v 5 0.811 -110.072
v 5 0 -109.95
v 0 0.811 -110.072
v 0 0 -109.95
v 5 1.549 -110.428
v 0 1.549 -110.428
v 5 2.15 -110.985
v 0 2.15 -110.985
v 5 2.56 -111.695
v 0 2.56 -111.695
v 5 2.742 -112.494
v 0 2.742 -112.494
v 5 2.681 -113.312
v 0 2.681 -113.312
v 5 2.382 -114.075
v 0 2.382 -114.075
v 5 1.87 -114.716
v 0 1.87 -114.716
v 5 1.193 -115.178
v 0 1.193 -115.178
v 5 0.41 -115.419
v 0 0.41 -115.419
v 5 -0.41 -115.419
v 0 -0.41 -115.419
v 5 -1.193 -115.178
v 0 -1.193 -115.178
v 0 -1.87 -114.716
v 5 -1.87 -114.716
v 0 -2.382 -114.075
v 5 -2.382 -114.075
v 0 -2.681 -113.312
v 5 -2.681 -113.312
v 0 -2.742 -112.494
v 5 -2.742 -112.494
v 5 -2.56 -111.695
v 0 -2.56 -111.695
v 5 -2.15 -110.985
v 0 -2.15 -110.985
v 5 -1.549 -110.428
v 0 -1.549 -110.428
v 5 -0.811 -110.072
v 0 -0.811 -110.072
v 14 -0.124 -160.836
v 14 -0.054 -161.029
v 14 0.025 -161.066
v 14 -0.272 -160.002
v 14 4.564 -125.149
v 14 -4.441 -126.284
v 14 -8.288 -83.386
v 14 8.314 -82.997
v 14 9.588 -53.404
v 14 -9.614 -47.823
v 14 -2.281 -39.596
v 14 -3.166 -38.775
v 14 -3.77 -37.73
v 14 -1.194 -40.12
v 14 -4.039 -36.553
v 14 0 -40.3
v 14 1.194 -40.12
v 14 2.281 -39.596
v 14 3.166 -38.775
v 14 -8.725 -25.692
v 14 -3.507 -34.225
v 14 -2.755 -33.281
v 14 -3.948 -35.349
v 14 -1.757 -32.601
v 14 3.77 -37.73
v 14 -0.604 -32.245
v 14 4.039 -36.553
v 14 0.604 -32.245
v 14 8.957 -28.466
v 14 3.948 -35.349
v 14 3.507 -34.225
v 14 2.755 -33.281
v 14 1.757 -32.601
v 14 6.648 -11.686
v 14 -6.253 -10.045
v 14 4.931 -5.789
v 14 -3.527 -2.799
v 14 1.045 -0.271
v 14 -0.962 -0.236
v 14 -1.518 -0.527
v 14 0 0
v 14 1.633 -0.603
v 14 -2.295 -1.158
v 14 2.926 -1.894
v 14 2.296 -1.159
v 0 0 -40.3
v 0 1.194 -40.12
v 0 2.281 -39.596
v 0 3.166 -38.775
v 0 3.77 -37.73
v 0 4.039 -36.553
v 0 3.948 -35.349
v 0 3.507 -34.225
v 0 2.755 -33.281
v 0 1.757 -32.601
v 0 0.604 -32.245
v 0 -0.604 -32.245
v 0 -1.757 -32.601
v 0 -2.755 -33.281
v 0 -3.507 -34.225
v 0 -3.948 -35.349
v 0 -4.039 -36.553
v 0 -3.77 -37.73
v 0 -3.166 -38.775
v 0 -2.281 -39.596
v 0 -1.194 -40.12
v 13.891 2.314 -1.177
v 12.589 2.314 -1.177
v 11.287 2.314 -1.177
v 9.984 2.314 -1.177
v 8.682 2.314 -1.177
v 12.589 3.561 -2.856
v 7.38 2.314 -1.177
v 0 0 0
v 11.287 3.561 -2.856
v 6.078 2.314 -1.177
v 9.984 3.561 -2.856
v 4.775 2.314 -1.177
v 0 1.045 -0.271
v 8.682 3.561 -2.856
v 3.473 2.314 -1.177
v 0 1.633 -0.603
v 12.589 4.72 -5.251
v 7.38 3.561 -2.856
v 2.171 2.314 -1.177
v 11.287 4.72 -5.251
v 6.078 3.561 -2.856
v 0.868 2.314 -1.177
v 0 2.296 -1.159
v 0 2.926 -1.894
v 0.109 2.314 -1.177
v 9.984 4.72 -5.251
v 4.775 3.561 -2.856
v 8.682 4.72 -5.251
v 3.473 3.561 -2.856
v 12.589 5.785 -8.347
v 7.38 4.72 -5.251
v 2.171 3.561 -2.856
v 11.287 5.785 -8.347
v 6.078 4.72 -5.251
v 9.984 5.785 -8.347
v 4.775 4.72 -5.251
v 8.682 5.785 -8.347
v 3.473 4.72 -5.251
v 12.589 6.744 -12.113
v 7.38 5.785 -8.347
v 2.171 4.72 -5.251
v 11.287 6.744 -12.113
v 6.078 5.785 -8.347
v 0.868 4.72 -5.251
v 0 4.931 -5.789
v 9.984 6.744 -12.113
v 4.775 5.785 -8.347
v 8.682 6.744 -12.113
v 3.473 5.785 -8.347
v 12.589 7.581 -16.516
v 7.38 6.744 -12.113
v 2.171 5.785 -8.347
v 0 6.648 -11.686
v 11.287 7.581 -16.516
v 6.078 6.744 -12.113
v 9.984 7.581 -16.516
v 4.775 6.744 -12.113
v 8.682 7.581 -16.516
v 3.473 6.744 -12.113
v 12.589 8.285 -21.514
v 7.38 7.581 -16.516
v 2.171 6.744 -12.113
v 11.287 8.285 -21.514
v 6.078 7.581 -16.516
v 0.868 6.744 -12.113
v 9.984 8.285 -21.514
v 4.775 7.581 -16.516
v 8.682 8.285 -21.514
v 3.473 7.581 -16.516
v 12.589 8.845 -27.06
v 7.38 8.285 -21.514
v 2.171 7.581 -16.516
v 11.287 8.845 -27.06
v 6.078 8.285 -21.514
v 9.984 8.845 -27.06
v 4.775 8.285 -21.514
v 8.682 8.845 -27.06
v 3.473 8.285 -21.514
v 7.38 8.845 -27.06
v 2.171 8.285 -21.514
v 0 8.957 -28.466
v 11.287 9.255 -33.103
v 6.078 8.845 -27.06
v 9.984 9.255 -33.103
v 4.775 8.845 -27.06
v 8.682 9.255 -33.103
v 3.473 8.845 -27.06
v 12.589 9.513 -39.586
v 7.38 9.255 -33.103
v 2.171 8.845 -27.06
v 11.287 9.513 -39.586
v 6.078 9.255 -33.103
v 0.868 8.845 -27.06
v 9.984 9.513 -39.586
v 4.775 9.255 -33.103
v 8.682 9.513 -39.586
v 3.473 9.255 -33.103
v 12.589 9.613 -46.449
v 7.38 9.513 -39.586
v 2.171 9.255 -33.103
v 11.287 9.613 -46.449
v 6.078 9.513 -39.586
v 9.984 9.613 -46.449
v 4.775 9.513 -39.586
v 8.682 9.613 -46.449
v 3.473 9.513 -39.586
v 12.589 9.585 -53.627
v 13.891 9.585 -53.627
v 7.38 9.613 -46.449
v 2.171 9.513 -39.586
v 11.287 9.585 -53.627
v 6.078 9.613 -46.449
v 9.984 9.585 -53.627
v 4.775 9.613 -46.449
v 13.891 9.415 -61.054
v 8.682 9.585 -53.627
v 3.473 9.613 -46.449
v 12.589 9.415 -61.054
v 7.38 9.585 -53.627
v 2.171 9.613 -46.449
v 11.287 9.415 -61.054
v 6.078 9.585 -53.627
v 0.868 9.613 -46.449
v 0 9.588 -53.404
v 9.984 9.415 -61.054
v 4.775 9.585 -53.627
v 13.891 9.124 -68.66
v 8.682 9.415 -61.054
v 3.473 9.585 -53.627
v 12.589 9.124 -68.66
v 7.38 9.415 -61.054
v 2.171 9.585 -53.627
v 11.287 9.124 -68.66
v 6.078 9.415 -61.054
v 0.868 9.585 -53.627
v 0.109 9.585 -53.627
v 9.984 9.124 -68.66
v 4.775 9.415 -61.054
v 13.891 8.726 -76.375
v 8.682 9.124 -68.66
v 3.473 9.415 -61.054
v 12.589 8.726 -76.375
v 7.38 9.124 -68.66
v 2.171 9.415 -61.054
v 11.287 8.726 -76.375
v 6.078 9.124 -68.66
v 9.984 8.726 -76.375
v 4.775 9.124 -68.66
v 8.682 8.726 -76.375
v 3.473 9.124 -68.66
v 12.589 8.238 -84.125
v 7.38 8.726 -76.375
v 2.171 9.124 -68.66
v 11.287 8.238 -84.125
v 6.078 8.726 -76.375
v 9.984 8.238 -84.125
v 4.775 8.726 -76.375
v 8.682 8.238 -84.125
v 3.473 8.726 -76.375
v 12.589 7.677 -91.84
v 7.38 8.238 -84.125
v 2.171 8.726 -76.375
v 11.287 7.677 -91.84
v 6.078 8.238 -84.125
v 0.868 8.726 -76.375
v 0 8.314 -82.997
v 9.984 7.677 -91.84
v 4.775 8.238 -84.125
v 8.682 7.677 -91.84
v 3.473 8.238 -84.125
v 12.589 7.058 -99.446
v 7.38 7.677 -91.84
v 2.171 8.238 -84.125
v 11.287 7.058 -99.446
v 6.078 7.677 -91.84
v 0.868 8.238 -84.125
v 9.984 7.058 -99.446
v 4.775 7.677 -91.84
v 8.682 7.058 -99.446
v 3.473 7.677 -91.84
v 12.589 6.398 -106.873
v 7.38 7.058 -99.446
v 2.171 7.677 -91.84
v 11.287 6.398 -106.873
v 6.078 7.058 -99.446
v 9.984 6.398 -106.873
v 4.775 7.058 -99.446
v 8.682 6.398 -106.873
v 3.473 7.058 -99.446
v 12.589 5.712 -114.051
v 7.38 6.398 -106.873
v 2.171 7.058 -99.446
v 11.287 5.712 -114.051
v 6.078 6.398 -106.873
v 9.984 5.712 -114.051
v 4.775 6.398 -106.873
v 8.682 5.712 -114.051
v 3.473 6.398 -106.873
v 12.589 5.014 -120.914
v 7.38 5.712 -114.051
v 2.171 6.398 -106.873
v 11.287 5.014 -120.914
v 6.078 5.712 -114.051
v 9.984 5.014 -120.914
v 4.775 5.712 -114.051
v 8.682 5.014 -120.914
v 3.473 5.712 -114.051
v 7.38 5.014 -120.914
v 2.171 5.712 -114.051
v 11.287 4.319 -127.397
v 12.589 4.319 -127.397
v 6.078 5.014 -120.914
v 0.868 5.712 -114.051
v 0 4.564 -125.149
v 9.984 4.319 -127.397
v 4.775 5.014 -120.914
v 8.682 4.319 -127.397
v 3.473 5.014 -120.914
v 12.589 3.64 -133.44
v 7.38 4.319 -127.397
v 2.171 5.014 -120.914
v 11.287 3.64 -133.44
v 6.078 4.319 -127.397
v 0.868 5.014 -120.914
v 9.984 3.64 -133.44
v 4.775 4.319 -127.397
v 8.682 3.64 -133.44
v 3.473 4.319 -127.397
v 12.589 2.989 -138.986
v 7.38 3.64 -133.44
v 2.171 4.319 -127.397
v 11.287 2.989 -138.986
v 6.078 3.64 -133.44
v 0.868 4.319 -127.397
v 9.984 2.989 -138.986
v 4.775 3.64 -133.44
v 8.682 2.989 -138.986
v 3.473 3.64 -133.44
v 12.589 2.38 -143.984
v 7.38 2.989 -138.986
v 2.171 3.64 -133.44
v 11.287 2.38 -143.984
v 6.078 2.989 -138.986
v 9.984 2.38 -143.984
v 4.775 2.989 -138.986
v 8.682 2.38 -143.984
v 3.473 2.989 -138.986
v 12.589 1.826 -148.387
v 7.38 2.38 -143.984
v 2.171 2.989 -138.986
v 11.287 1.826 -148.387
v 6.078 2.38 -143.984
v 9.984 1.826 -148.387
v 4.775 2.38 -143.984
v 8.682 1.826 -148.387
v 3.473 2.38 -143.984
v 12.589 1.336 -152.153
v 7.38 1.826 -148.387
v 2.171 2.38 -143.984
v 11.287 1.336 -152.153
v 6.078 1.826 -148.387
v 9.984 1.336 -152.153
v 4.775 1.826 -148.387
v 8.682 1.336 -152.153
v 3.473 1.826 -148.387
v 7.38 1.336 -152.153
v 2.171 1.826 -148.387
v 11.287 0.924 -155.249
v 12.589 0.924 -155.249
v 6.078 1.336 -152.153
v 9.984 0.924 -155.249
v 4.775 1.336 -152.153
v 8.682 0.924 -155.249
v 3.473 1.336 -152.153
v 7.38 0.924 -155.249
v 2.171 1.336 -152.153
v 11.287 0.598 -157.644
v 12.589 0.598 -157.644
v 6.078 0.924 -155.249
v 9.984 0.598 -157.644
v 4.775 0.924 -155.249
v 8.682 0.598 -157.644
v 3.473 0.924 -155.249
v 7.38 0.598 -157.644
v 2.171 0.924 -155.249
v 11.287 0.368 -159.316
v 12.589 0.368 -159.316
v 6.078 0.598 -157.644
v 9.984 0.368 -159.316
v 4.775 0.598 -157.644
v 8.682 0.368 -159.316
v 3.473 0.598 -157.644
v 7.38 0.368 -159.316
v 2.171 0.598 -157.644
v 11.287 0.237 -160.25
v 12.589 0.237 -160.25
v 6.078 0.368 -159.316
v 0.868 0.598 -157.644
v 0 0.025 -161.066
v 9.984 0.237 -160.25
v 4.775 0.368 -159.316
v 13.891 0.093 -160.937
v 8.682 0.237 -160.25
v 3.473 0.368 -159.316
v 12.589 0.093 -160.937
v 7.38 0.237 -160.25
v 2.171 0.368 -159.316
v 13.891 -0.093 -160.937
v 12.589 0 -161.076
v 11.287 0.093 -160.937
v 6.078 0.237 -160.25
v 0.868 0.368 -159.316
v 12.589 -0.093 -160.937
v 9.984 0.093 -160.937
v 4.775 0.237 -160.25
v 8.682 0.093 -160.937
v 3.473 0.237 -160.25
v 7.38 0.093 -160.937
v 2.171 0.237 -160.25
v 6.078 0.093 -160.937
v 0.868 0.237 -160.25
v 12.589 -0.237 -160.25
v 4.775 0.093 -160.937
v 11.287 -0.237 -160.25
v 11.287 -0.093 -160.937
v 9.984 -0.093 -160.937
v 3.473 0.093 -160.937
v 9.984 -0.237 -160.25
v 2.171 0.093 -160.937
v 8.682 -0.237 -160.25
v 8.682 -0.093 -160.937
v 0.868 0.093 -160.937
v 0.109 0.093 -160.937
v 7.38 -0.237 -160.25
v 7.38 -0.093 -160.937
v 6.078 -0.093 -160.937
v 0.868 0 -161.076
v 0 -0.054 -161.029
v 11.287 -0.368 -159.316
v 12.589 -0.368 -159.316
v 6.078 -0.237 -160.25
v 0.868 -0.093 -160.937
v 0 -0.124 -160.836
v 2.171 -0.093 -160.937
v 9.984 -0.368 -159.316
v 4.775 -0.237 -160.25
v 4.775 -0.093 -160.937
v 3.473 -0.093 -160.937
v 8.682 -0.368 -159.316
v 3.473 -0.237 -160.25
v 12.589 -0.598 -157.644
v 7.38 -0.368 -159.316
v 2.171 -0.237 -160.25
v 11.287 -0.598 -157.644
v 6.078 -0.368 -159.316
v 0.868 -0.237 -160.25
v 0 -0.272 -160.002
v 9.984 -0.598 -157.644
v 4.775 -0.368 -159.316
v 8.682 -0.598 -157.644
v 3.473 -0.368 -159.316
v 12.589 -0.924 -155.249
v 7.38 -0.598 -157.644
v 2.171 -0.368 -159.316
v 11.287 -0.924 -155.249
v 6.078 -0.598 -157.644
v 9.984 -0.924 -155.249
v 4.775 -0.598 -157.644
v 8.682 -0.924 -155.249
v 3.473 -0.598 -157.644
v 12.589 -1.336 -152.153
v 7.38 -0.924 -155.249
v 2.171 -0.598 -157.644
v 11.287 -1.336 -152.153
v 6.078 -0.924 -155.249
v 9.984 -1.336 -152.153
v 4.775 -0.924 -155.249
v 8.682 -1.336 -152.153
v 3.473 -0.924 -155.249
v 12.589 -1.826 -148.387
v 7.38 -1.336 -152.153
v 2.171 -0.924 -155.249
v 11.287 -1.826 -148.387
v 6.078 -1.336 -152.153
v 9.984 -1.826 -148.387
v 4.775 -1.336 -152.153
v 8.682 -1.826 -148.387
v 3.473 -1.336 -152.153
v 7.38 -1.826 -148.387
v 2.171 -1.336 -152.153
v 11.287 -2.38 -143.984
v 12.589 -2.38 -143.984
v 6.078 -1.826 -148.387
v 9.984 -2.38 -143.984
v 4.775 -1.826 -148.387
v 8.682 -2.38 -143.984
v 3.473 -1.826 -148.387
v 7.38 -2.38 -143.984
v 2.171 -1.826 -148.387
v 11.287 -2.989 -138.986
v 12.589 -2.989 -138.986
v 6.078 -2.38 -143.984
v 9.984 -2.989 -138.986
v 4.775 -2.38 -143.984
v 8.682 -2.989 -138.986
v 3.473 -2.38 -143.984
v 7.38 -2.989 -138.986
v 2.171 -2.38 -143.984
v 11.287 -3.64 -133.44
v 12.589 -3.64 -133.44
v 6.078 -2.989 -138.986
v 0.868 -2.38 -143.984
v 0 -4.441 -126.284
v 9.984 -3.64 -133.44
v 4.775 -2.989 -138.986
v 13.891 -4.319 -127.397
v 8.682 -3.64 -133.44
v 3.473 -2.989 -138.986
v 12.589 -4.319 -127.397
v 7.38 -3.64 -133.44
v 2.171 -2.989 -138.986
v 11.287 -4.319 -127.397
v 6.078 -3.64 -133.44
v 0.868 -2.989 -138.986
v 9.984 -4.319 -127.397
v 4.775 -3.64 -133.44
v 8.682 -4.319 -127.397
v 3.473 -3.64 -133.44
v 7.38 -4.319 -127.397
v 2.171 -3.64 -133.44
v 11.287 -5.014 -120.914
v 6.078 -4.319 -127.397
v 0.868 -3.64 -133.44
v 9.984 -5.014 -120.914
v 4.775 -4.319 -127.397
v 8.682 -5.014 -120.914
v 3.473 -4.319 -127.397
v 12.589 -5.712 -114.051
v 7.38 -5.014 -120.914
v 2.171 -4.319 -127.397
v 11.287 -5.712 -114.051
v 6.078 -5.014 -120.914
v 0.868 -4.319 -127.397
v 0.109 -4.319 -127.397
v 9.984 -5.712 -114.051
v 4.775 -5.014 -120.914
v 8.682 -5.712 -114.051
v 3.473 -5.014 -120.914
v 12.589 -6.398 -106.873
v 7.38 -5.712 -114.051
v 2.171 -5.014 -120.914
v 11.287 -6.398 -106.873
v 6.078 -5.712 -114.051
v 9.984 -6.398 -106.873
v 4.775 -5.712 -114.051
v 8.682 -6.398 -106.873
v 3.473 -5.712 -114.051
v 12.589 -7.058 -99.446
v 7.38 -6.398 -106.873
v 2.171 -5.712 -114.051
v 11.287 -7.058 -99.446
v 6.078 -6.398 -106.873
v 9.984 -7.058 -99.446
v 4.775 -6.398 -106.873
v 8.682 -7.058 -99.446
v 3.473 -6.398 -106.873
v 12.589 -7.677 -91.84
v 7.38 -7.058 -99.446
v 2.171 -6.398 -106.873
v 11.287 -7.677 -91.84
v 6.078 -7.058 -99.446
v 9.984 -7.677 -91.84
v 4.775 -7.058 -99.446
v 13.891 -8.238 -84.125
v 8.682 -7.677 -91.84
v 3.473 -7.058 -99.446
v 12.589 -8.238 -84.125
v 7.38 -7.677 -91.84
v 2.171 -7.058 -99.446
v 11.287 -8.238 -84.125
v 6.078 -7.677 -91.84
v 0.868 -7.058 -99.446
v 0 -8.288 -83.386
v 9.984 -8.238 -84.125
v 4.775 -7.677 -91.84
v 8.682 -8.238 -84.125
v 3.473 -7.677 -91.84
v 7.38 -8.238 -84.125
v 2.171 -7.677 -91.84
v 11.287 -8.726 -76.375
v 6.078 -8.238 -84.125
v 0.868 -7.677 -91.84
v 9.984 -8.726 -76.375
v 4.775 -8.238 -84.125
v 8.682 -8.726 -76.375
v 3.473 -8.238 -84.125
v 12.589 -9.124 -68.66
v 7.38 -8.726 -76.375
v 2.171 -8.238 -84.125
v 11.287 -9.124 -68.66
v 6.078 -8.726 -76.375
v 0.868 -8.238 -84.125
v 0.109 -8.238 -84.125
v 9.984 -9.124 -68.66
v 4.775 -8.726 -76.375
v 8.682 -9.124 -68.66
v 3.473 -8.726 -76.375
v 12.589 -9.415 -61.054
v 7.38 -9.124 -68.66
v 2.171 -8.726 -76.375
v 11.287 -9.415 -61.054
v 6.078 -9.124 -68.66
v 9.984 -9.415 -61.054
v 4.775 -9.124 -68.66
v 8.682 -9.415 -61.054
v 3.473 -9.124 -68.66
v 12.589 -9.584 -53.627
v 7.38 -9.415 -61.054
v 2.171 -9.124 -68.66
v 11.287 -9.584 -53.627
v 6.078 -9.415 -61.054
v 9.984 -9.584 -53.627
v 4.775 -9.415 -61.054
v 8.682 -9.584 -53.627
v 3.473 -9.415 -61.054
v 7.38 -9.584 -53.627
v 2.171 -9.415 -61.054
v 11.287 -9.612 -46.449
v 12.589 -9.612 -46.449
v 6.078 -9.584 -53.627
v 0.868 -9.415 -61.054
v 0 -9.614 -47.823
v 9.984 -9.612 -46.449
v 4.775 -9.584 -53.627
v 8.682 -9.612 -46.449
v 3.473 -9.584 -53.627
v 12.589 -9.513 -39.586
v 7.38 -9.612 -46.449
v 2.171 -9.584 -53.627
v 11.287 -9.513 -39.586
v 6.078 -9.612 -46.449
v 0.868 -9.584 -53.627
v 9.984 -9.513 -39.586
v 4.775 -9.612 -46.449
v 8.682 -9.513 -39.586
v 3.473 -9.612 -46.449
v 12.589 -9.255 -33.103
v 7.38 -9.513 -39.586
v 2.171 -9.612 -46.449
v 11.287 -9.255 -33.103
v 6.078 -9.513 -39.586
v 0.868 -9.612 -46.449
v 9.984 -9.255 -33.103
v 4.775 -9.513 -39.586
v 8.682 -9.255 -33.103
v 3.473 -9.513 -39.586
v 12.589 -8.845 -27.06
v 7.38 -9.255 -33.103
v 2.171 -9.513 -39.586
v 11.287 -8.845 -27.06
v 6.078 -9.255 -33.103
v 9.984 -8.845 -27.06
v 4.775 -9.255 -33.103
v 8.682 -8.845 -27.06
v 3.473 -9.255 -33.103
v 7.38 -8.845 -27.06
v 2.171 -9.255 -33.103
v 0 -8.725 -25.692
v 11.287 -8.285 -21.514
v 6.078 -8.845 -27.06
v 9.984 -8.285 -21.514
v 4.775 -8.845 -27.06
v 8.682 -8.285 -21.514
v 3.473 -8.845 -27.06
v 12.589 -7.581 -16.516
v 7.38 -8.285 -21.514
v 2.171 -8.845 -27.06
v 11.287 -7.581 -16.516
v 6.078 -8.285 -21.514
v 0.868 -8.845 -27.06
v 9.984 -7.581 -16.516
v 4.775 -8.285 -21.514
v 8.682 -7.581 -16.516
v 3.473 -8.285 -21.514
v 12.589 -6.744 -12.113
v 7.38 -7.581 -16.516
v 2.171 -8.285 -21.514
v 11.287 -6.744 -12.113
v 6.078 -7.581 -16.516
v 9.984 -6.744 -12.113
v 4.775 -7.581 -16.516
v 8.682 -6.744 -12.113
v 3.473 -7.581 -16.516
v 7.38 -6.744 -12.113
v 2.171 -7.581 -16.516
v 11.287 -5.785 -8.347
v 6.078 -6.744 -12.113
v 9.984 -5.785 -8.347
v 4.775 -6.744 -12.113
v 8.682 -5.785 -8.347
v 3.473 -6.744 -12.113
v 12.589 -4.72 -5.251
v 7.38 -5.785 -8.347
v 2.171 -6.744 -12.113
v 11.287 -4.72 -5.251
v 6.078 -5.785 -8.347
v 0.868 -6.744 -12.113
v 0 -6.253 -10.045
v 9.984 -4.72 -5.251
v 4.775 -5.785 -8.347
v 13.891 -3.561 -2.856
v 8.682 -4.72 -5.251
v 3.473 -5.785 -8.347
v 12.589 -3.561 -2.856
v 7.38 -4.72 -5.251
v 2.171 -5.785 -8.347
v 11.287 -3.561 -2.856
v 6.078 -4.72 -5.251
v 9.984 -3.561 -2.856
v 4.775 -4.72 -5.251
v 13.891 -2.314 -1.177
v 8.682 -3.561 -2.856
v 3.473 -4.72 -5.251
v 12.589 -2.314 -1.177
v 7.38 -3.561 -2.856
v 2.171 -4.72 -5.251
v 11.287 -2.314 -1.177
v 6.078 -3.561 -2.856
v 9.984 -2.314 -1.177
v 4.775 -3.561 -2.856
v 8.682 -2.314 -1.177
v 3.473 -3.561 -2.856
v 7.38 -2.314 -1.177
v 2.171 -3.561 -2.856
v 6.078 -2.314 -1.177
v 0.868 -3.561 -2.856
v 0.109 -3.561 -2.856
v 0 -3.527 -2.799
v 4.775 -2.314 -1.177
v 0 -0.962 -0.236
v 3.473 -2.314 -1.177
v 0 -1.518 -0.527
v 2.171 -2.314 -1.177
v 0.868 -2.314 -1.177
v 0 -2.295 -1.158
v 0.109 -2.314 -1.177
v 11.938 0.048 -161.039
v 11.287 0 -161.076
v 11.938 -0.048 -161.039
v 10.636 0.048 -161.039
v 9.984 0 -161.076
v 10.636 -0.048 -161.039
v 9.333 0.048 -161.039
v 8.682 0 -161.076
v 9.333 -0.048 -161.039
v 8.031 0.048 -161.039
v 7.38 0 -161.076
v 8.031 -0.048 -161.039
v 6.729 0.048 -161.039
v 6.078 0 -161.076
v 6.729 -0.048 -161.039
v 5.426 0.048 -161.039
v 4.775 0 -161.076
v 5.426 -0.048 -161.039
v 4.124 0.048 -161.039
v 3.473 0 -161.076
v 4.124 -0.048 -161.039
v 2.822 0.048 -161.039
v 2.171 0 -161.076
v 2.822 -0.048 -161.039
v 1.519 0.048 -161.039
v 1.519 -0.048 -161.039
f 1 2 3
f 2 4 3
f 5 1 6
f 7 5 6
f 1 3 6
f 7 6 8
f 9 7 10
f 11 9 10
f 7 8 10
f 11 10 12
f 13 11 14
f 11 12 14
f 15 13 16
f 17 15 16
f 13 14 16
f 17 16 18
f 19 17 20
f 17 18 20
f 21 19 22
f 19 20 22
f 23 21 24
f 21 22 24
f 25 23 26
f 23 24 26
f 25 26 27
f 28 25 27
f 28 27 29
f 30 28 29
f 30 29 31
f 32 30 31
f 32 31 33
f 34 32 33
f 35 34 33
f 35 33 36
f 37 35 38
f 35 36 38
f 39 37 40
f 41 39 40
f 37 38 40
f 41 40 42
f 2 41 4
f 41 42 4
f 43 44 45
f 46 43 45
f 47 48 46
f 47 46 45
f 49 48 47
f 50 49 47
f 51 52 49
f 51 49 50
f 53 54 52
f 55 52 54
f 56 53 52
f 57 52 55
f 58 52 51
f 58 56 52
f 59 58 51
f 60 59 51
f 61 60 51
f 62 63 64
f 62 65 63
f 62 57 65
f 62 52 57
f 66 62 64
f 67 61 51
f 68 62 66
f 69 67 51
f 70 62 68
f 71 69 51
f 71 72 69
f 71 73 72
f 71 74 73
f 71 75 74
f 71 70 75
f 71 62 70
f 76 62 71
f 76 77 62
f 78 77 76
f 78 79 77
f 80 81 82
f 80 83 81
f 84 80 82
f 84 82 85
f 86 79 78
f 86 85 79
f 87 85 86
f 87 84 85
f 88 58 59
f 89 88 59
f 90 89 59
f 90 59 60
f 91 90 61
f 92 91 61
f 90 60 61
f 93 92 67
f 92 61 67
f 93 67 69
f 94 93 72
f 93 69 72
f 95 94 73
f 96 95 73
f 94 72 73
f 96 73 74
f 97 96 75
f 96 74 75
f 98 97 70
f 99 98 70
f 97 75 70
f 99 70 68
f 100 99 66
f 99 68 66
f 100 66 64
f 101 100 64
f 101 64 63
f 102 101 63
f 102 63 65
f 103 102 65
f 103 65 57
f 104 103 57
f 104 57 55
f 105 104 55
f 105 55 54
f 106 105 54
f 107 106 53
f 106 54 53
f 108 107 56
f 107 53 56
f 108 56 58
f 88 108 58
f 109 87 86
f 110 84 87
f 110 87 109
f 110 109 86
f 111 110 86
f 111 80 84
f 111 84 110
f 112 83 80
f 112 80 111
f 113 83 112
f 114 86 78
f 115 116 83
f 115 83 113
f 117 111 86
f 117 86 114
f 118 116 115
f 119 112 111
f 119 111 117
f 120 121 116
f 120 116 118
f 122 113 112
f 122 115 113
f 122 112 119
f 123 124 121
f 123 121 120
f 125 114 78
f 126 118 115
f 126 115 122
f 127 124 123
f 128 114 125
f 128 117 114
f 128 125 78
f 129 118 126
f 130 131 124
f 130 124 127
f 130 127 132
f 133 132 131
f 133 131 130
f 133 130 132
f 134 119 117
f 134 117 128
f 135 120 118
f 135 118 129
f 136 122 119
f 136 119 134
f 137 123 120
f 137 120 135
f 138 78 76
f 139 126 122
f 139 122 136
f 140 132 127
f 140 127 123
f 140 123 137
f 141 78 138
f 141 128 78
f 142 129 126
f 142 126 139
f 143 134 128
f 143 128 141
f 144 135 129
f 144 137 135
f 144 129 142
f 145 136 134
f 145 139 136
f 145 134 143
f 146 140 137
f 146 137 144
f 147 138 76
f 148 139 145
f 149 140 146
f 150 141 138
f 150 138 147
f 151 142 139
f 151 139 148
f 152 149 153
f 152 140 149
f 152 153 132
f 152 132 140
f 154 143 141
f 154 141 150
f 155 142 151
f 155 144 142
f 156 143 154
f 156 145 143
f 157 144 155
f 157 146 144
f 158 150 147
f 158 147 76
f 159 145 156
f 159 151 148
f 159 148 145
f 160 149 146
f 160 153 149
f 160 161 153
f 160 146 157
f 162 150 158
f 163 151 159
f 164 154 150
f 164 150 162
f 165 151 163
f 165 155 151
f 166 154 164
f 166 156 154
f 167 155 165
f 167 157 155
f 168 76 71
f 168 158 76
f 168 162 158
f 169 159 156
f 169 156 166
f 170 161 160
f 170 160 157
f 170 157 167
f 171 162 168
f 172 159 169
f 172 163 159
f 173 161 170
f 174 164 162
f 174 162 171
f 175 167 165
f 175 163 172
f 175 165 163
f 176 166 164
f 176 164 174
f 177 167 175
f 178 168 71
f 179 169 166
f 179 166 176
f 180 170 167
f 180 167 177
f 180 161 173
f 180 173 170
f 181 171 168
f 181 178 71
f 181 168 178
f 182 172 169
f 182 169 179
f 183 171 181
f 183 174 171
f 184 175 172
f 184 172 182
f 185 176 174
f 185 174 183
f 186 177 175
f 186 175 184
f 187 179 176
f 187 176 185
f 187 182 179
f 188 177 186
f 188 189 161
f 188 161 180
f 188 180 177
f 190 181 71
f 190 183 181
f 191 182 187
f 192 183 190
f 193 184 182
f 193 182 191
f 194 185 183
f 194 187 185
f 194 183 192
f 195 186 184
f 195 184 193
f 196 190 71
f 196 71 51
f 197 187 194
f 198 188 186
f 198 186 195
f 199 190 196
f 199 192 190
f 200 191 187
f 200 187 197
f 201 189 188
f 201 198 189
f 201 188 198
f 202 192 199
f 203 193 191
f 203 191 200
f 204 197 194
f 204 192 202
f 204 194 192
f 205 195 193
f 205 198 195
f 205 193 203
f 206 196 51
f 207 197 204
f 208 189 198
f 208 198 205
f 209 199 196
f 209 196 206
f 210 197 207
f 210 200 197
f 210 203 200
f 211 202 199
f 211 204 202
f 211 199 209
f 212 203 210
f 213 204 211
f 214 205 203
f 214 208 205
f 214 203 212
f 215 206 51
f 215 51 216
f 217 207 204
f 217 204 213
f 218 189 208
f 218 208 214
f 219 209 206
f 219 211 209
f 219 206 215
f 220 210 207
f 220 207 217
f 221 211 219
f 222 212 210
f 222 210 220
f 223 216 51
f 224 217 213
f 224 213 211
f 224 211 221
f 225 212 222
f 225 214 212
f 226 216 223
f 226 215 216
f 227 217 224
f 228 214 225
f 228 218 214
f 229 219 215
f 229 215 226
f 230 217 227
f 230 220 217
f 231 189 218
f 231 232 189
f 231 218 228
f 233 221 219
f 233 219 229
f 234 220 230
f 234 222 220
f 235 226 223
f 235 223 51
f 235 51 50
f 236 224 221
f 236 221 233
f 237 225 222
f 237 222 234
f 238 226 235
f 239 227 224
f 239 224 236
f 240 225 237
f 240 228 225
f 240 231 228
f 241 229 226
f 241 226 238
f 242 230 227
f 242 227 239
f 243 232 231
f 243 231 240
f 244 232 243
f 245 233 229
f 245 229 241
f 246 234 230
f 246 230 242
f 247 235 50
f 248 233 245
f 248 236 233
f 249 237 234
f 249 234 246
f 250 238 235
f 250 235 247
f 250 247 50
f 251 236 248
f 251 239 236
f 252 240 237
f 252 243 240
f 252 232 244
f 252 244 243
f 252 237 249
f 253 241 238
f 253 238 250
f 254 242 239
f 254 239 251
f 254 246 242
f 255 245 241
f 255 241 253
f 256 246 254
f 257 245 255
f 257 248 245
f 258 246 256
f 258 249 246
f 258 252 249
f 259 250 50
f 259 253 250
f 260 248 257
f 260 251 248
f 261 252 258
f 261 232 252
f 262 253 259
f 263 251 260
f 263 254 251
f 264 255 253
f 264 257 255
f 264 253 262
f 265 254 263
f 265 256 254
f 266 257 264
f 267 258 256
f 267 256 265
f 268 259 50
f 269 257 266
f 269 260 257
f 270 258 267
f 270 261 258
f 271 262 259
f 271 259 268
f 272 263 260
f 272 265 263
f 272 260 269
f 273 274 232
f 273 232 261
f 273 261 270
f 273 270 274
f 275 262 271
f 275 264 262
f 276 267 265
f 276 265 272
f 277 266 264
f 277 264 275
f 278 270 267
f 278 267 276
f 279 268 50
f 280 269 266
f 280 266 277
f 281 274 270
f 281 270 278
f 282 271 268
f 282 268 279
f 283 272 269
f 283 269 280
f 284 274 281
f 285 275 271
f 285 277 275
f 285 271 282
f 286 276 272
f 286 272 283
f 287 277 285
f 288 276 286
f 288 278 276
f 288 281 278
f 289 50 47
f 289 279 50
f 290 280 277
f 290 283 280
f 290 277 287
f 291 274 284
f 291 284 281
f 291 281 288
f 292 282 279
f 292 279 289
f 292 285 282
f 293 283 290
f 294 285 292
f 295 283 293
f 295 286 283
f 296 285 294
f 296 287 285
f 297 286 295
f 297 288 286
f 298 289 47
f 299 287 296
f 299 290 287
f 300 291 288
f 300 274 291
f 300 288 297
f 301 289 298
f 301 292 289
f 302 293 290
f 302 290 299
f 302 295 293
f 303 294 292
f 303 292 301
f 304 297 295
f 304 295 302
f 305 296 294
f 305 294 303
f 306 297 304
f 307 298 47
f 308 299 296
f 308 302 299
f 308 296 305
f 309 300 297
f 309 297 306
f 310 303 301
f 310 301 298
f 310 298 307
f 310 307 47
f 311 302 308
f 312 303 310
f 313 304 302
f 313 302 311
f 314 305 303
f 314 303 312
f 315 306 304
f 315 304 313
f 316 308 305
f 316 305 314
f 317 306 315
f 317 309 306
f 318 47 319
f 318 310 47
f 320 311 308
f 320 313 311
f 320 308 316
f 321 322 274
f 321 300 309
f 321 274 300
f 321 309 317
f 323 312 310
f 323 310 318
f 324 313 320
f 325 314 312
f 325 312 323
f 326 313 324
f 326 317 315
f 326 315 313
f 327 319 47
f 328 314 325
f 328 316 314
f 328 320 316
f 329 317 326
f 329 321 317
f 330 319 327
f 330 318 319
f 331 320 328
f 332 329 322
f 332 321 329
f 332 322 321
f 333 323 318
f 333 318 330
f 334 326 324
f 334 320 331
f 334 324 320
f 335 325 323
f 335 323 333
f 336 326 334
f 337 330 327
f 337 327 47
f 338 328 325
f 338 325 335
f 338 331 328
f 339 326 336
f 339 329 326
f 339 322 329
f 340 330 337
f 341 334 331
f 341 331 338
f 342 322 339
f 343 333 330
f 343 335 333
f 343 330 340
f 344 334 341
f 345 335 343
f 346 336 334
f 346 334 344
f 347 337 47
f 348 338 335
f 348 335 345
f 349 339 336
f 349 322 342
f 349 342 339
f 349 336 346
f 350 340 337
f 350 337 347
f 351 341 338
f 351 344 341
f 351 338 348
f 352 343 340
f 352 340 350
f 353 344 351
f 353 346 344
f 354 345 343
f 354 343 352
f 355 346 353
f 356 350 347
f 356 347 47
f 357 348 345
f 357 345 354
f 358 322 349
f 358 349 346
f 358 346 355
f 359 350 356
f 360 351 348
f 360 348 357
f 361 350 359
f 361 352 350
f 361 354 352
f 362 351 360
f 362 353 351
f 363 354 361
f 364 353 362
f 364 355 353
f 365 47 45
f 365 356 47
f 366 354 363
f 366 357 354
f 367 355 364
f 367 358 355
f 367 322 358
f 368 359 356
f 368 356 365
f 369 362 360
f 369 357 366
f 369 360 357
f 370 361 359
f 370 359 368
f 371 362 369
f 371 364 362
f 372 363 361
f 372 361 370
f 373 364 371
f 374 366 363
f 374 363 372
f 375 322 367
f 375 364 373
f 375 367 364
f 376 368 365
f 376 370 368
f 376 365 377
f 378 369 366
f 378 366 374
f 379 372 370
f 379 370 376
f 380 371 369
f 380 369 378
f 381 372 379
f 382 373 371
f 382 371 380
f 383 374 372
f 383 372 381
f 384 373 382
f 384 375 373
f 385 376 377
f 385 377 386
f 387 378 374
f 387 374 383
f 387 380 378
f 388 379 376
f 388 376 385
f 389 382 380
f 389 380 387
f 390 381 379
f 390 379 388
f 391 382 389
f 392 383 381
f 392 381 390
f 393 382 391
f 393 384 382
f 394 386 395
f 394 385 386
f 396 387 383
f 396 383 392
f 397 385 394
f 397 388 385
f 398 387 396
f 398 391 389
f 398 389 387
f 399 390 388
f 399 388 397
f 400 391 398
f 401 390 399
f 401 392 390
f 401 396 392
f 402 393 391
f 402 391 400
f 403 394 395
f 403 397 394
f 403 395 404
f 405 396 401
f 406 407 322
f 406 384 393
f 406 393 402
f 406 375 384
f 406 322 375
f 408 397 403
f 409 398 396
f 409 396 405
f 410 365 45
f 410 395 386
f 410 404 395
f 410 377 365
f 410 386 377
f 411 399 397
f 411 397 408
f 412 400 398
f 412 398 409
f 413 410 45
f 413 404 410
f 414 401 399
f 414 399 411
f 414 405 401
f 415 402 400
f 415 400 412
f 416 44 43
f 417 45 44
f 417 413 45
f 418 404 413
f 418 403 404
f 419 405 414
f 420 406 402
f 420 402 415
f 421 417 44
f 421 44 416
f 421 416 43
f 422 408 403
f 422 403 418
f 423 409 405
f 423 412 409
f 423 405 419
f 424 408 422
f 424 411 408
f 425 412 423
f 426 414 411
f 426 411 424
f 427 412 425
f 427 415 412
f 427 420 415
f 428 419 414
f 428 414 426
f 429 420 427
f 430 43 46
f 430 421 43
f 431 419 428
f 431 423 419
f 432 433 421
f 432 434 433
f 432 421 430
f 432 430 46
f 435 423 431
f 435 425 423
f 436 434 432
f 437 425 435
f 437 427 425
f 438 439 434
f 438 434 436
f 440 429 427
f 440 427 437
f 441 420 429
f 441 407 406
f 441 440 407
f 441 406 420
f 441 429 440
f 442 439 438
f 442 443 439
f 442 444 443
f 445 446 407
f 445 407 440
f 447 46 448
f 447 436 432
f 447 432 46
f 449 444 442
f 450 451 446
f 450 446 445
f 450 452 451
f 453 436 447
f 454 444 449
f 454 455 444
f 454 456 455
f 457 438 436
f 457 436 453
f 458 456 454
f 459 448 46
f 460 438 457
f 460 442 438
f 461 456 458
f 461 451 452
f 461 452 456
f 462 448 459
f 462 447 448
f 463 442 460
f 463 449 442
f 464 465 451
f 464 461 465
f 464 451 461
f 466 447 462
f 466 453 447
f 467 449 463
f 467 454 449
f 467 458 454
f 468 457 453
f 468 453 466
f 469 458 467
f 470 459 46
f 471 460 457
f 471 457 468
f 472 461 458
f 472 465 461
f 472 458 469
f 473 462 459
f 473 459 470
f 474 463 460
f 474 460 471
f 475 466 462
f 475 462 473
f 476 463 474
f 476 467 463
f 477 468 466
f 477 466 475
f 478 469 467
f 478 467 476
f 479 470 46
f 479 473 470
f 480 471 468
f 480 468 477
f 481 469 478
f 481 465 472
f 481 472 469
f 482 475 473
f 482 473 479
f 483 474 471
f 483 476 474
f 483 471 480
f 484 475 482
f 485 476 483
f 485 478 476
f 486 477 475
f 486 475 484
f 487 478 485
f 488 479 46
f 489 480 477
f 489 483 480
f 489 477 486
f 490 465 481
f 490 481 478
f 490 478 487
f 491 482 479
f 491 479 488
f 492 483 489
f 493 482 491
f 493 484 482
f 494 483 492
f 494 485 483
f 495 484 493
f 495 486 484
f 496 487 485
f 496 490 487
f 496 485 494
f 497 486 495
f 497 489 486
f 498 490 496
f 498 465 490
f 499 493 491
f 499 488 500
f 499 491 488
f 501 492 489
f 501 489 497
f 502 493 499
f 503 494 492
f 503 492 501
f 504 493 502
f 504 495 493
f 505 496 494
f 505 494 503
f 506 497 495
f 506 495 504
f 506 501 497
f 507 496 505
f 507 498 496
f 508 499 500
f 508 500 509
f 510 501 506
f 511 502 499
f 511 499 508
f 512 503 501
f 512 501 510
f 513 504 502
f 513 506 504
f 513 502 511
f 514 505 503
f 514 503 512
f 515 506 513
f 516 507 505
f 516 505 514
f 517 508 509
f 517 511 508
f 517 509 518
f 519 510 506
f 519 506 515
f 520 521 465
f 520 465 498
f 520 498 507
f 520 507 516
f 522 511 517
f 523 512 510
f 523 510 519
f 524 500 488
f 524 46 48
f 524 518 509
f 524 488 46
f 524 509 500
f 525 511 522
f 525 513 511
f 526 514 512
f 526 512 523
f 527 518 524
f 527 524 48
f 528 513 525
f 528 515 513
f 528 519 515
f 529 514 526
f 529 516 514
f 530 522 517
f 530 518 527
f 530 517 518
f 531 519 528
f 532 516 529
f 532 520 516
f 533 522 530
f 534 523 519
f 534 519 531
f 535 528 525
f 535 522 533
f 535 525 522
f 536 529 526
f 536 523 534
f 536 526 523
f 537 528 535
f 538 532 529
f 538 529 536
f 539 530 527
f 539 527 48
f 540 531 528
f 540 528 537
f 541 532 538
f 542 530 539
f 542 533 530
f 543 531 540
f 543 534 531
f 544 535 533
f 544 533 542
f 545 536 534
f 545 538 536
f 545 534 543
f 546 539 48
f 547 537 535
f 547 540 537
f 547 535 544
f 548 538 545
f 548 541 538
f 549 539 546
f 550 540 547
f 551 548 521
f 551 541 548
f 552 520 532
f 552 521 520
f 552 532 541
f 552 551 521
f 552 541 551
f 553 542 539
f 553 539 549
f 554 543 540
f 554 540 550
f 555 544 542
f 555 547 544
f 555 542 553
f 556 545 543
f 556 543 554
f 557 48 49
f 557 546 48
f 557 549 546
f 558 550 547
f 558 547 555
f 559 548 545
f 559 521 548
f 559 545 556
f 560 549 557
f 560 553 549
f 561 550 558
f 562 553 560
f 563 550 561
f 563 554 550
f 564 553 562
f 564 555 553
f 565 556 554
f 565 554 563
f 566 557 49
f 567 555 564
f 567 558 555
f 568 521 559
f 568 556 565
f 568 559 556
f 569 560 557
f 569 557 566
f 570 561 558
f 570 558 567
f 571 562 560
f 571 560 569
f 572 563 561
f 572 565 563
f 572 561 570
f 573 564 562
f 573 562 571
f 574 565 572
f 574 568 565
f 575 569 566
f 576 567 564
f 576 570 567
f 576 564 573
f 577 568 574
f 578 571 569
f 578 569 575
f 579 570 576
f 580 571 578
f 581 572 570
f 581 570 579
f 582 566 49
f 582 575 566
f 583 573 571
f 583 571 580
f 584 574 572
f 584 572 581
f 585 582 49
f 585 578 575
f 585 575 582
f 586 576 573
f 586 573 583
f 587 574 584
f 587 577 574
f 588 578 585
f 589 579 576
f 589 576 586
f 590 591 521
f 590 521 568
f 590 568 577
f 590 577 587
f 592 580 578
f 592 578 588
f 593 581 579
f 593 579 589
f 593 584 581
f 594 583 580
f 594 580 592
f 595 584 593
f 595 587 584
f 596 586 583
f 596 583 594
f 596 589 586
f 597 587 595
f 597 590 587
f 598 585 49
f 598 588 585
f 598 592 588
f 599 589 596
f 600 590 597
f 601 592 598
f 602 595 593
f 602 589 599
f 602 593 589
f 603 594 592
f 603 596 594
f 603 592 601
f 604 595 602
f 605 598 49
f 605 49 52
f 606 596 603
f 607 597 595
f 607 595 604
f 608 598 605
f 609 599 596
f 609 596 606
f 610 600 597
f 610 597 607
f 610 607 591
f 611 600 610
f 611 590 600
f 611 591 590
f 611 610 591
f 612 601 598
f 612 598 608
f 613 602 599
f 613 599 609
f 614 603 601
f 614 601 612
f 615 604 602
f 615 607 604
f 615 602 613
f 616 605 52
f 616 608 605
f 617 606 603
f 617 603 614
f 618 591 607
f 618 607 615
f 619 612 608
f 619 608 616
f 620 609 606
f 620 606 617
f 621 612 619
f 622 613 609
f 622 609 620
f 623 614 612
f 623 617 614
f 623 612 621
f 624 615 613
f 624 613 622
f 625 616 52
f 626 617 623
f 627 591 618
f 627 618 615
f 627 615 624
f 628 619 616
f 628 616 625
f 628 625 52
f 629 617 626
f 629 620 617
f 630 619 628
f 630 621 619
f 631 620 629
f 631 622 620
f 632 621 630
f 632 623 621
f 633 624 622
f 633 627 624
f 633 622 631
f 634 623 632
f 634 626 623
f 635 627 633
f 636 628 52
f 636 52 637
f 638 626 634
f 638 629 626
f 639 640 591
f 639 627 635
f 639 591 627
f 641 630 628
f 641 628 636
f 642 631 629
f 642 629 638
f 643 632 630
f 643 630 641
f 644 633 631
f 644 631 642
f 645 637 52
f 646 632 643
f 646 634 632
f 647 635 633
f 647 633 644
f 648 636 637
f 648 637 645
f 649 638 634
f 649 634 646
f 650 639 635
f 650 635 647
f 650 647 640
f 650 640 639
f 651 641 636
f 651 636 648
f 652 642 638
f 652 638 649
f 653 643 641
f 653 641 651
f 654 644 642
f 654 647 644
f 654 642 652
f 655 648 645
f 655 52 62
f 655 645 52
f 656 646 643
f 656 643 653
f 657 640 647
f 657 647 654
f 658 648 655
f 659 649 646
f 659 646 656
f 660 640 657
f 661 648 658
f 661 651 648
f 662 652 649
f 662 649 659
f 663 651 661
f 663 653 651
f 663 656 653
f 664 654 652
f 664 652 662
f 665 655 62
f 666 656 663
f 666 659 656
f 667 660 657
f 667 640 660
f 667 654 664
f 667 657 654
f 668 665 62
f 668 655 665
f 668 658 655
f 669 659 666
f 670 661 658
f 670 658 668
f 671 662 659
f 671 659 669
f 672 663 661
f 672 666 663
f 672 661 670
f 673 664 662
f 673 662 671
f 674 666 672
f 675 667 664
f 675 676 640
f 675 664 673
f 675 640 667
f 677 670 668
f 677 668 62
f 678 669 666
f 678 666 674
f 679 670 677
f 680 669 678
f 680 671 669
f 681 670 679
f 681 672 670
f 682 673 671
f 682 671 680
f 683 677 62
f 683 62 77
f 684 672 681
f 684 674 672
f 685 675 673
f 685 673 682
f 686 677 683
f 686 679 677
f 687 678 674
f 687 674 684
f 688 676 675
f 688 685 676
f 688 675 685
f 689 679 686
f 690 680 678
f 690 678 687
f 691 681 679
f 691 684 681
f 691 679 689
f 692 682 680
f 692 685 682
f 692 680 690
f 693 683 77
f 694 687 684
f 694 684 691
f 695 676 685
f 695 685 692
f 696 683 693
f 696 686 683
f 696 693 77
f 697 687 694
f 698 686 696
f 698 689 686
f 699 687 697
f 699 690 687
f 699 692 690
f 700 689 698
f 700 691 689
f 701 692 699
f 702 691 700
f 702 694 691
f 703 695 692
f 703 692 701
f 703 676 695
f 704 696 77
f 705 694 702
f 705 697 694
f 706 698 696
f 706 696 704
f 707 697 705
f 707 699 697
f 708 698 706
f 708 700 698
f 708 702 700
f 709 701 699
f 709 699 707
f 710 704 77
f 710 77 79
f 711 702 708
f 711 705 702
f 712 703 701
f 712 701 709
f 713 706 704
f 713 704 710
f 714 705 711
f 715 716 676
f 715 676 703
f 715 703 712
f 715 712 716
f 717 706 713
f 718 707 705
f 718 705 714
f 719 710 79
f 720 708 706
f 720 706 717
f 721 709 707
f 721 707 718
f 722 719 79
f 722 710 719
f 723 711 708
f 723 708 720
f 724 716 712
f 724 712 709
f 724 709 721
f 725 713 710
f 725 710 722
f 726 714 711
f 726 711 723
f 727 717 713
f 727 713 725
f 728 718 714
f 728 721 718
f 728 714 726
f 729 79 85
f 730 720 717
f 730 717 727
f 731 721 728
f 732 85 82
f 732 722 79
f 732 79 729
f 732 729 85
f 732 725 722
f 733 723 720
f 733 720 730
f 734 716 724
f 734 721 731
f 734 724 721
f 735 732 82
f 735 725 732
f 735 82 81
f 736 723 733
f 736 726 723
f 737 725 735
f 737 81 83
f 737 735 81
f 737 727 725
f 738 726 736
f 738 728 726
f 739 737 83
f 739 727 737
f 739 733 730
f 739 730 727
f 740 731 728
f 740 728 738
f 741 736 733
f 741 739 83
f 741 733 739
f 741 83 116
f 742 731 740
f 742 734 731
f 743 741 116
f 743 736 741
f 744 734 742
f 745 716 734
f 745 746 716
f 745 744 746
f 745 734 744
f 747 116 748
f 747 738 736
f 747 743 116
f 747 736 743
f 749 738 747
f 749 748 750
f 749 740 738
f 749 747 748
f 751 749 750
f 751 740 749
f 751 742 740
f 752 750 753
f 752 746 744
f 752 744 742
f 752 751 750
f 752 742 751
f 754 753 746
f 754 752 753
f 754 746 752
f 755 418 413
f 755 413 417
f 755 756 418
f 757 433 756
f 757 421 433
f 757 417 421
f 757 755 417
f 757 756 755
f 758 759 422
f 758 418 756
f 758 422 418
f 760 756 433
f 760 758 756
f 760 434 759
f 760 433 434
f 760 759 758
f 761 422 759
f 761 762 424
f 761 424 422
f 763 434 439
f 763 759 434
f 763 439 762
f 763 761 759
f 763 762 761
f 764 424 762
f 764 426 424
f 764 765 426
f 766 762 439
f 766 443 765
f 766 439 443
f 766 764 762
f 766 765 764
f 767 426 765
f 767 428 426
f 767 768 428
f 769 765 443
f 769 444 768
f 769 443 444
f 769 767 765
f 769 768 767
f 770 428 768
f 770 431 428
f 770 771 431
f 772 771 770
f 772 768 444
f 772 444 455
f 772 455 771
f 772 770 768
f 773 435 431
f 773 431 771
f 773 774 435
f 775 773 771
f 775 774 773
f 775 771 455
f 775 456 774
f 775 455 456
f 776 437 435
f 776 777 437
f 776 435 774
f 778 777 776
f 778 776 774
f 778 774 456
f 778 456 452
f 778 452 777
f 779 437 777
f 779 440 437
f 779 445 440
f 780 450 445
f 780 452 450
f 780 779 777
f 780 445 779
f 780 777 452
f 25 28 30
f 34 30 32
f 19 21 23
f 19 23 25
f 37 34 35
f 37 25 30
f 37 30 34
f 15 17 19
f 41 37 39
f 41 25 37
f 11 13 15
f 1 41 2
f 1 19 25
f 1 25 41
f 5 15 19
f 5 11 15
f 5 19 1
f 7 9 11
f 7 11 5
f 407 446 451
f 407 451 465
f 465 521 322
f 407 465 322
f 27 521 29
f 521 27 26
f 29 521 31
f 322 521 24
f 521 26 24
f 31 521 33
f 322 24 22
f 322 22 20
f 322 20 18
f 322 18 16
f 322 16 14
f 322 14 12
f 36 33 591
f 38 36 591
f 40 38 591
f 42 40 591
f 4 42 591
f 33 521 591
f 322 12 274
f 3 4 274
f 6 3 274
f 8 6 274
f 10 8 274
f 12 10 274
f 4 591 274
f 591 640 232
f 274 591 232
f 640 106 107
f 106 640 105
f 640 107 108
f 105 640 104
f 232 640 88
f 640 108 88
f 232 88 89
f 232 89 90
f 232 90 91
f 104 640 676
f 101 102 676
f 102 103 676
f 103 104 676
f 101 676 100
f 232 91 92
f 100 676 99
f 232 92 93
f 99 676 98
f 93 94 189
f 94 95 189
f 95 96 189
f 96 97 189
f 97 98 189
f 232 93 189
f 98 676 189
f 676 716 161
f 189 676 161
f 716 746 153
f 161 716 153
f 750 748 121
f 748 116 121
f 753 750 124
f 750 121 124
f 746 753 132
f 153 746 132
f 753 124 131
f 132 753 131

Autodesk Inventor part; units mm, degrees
ref_plane "YZ Plane" through (0, 0, 0) normal (1, 0, 0) x (0, 1, 0)
ref_plane "XZ Plane" through (0, 0, 0) normal (0, 1, 0) x (-1, 0, 0)
ref_plane "XY Plane" through (0, 0, 0) normal (0, 0, 1) x (1, 0, 0)
sketch "Sketch9" plane through (0, 0, 0) normal (1, 0, 0) x (0, 1, 0)
  line L0 (0, 0) -> (0.6838, -0.0937) construction
  line L1 (0.6838, -0.0937) -> (1.3528, -0.3746) construction
  line L2 (1.3528, -0.3746) -> (2.0064, -0.8421) construction
  line L3 (2.0064, -0.8421) -> (2.6435, -1.495) construction
  line L4 (2.6435, -1.495) -> (3.263, -2.3319) construction
  line L5 (3.263, -2.3319) -> (3.8633, -3.3508) construction
  line L6 (3.8633, -3.3508) -> (4.4431, -4.5492) construction
  line L7 (4.4431, -4.5492) -> (5.0005, -5.9245) construction
  line L8 (5.0005, -5.9245) -> (5.5339, -7.4733) construction
  line L9 (5.5339, -7.4733) -> (6.0414, -9.1922) construction
  line L10 (6.0414, -9.1922) -> (6.5213, -11.0769) construction
  line L11 (6.5213, -11.0769) -> (6.9717, -13.1233) construction
  line L12 (6.9717, -13.1233) -> (7.3908, -15.3264) construction
  line L13 (7.3908, -15.3264) -> (7.7773, -17.6811) construction
  line L14 (7.7773, -17.6811) -> (8.1295, -20.182) construction
  line L15 (8.1295, -20.182) -> (8.4463, -22.8232) construction
  line L16 (8.4463, -22.8232) -> (8.7266, -25.5985) construction
  line L17 (8.7266, -25.5985) -> (8.9696, -28.5014) construction
  line L18 (8.9696, -28.5014) -> (9.1748, -31.5252) construction
  line L19 (9.1748, -31.5252) -> (9.3419, -34.6628) construction
  line L20 (9.3419, -34.6628) -> (9.4708, -37.9069) construction
  line L21 (9.4708, -37.9069) -> (9.5619, -41.2498) construction
  line L22 (9.5619, -41.2498) -> (9.6156, -44.6839) construction
  line L23 (9.6156, -44.6839) -> (9.6156, -48.201) construction
  line L24 (9.6156, -48.201) -> (9.6156, -51.793) construction
  line L25 (9.6156, -51.793) -> (9.5617, -55.4514) construction
  line L26 (9.5617, -55.4514) -> (9.4762, -59.1677) construction
  line L27 (9.4762, -59.1677) -> (9.3595, -62.9333) construction
  line L28 (9.3595, -62.9333) -> (9.2132, -66.7394) construction
  line L29 (9.2132, -66.7394) -> (9.0394, -70.5769) construction
  line L30 (9.0394, -70.5769) -> (8.8398, -74.4371) construction
  line L31 (8.8398, -74.4371) -> (8.6167, -78.3109) construction
  line L32 (8.6167, -78.3109) -> (8.372, -82.1891) construction
  line L33 (8.372, -82.1891) -> (8.1078, -86.0629) construction
  line L34 (8.1078, -86.0629) -> (7.8263, -89.9231) construction
  line L35 (7.8263, -89.9231) -> (7.5294, -93.7607) construction
  line L36 (7.5294, -93.7607) -> (7.2193, -97.5667) construction
  line L37 (7.2193, -97.5667) -> (6.8979, -101.3323) construction
  line L38 (6.8979, -101.3323) -> (6.5672, -105.0486) construction
  line L39 (6.5672, -105.0486) -> (6.2291, -108.7071) construction
  line L40 (6.2291, -108.7071) -> (5.8855, -112.299) construction
  line L41 (5.8855, -112.299) -> (5.5382, -115.8161) construction
  line L42 (5.5382, -115.8161) -> (5.1889, -119.2502) construction
  line L43 (5.1889, -119.2502) -> (4.8393, -122.5931) construction
  line L44 (4.8393, -122.5931) -> (4.4912, -125.8372) construction
  line L45 (4.4912, -125.8372) -> (4.1463, -128.9748) construction
  line L46 (4.1463, -128.9748) -> (3.8061, -131.9986) construction
  line L47 (3.8061, -131.9986) -> (3.4724, -134.9015) construction
  line L48 (3.4724, -134.9015) -> (3.1466, -137.6768) construction
  line L49 (3.1466, -137.6768) -> (2.8305, -140.318) construction
  line L50 (2.8305, -140.318) -> (2.5255, -142.8189) construction
  line L51 (2.5255, -142.8189) -> (2.2332, -145.1736) construction
  line L52 (2.2332, -145.1736) -> (1.9553, -147.3767) construction
  line L53 (1.9553, -147.3767) -> (1.693, -149.4231) construction
  line L54 (1.693, -149.4231) -> (1.448, -151.3078) construction
  line L55 (1.448, -151.3078) -> (1.2215, -153.0267) construction
  line L56 (1.2215, -153.0267) -> (1.015, -154.5755) construction
  line L57 (1.015, -154.5755) -> (0.8295, -155.9508) construction
  line L58 (0.8295, -155.9508) -> (0.6664, -157.1492) construction
  line L59 (0.6664, -157.1492) -> (0.5265, -158.1681) construction
  line L60 (0.5265, -158.1681) -> (0.4108, -159.0049) construction
  line L61 (0.4108, -159.0049) -> (0.32, -159.6579) construction
  line L62 (0.32, -159.6579) -> (0.2547, -160.1254) construction
  line L63 (0.2547, -160.1254) -> (0.2154, -160.4063) construction
  line L64 (0.2154, -160.4063) -> (0.2022, -160.5) construction
  line L65 (0.2022, -160.5) -> (0, -161.463) construction
  line L66 (0, -161.463) -> (-0.2022, -160.5) construction
  line L67 (-0.2022, -160.5) -> (-0.2154, -160.4063) construction
  line L68 (-0.2154, -160.4063) -> (-0.2547, -160.1254) construction
  line L69 (-0.2547, -160.1254) -> (-0.32, -159.6579) construction
  line L70 (-0.32, -159.6579) -> (-0.4108, -159.0049) construction
  line L71 (-0.4108, -159.0049) -> (-0.5265, -158.1681) construction
  line L72 (-0.5265, -158.1681) -> (-0.6664, -157.1492) construction
  line L73 (-0.6664, -157.1492) -> (-0.8295, -155.9508) construction
  line L74 (-0.8295, -155.9508) -> (-1.015, -154.5755) construction
  line L75 (-1.015, -154.5755) -> (-1.2215, -153.0267) construction
  line L76 (-1.2215, -153.0267) -> (-1.448, -151.3078) construction
  line L77 (-1.448, -151.3078) -> (-1.693, -149.4231) construction
  line L78 (-1.693, -149.4231) -> (-1.9553, -147.3767) construction
  line L79 (-1.9553, -147.3767) -> (-2.2332, -145.1736) construction
  line L80 (-2.2332, -145.1736) -> (-2.5255, -142.8189) construction
  line L81 (-2.5255, -142.8189) -> (-2.8305, -140.318) construction
  line L82 (-2.8305, -140.318) -> (-3.1466, -137.6768) construction
  line L83 (-3.1466, -137.6768) -> (-3.4724, -134.9015) construction
  line L84 (-3.4724, -134.9015) -> (-3.8061, -131.9986) construction
  line L85 (-3.8061, -131.9986) -> (-4.1463, -128.9748) construction
  line L86 (-4.1463, -128.9748) -> (-4.4912, -125.8372) construction
  line L87 (-4.4912, -125.8372) -> (-4.8393, -122.5931) construction
  line L88 (-4.8393, -122.5931) -> (-5.1889, -119.2502) construction
  line L89 (-5.1889, -119.2502) -> (-5.5382, -115.8161) construction
  line L90 (-5.5382, -115.8161) -> (-5.8855, -112.299) construction
  line L91 (-5.8855, -112.299) -> (-6.2291, -108.7071) construction
  line L92 (-6.2291, -108.7071) -> (-6.5672, -105.0486) construction
  line L93 (-6.5672, -105.0486) -> (-6.8979, -101.3323) construction
  line L94 (-6.8979, -101.3323) -> (-7.2193, -97.5667) construction
  line L95 (-7.2193, -97.5667) -> (-7.5294, -93.7607) construction
  line L96 (-7.5294, -93.7607) -> (-7.8263, -89.9231) construction
  line L97 (-7.8263, -89.9231) -> (-8.1078, -86.0629) construction
  line L98 (-8.1078, -86.0629) -> (-8.372, -82.1891) construction
  line L99 (-8.372, -82.1891) -> (-8.6167, -78.3109) construction
  line L100 (-8.6167, -78.3109) -> (-8.8398, -74.4371) construction
  line L101 (-8.8398, -74.4371) -> (-9.0394, -70.5769) construction
  line L102 (-9.0394, -70.5769) -> (-9.2132, -66.7394) construction
  line L103 (-9.2132, -66.7394) -> (-9.3595, -62.9333) construction
  line L104 (-9.3595, -62.9333) -> (-9.4762, -59.1677) construction
  line L105 (-9.4762, -59.1677) -> (-9.5617, -55.4514) construction
  line L106 (-9.5617, -55.4514) -> (-9.6144, -51.793) construction
  line L107 (-9.6144, -51.793) -> (-9.6144, -48.201) construction
  line L108 (-9.6144, -48.201) -> (-9.6144, -44.6839) construction
  line L109 (-9.6144, -44.6839) -> (-9.5619, -41.2498) construction
  line L110 (-9.5619, -41.2498) -> (-9.4708, -37.9069) construction
  line L111 (-9.4708, -37.9069) -> (-9.3419, -34.6628) construction
  line L112 (-9.3419, -34.6628) -> (-9.1748, -31.5252) construction
  line L113 (-9.1748, -31.5252) -> (-8.9696, -28.5014) construction
  line L114 (-8.9696, -28.5014) -> (-8.7266, -25.5985) construction
  line L115 (-8.7266, -25.5985) -> (-8.4463, -22.8232) construction
  line L116 (-8.4463, -22.8232) -> (-8.1295, -20.182) construction
  line L117 (-8.1295, -20.182) -> (-7.7773, -17.6811) construction
  line L118 (-7.7773, -17.6811) -> (-7.3908, -15.3264) construction
  line L119 (-7.3908, -15.3264) -> (-6.9717, -13.1233) construction
  line L120 (-6.9717, -13.1233) -> (-6.5213, -11.0769) construction
  line L121 (-6.5213, -11.0769) -> (-6.0414, -9.1922) construction
  line L122 (-6.0414, -9.1922) -> (-5.5339, -7.4733) construction
  line L123 (-5.5339, -7.4733) -> (-5.0005, -5.9245) construction
  line L124 (-5.0005, -5.9245) -> (-4.4431, -4.5492) construction
  line L125 (-4.4431, -4.5492) -> (-3.8633, -3.3508) construction
  line L126 (-3.8633, -3.3508) -> (-3.263, -2.3319) construction
  line L127 (-3.263, -2.3319) -> (-2.6435, -1.495) construction
  line L128 (-2.6435, -1.495) -> (-2.0064, -0.8421) construction
  line L129 (-2.0064, -0.8421) -> (-1.3528, -0.3746) construction
  line L130 (-1.3528, -0.3746) -> (-0.6838, -0.0937) construction
  line L131 (-0.6838, -0.0937) -> (0, 0) construction
  spline S0 degree 4 poles (0, 0) (0.6838, -0.0937) (1.3528, -0.3746) (2.0064, -0.8421) (2.6435, -1.495) (3.263, -2.3319) (3.8633, -3.3508) (4.4431, -4.5492) (5.0005, -5.9245) (5.5339, -7.4733) (6.0414, -9.1922) (6.5213, -11.0769) (6.9717, -13.1233) (7.3908, -15.3264) (7.7773, -17.6811) (8.1295, -20.182) (8.4463, -22.8232) (8.7266, -25.5985) (8.9696, -28.5014) (9.1748, -31.5252) (9.3419, -34.6628) (9.4708, -37.9069) (9.5619, -41.2498) (9.6156, -44.6839) (9.6156, -48.201) (9.6156, -51.793) (9.5617, -55.4514) (9.4762, -59.1677) (9.3595, -62.9333) (9.2132, -66.7394) (9.0394, -70.5769) (8.8398, -74.4371) (8.6167, -78.3109) (8.372, -82.1891) (8.1078, -86.0629) (7.8263, -89.9231) (7.5294, -93.7607) (7.2193, -97.5667) (6.8979, -101.3323) (6.5672, -105.0486) (6.2291, -108.7071) (5.8855, -112.299) (5.5382, -115.8161) (5.1889, -119.2502) (4.8393, -122.5931) (4.4912, -125.8372) (4.1463, -128.9748) (3.8061, -131.9986) (3.4724, -134.9015) (3.1466, -137.6768) (2.8305, -140.318) (2.5255, -142.8189) (2.2332, -145.1736) (1.9553, -147.3767) (1.693, -149.4231) (1.448, -151.3078) (1.2215, -153.0267) (1.015, -154.5755) (0.8295, -155.9508) (0.6664, -157.1492) (0.5265, -158.1681) (0.4108, -159.0049) (0.32, -159.6579) (0.2547, -160.1254) (0.2154, -160.4063) (0.2022, -160.5) (0, -161.463) (-0.2022, -160.5) (-0.2154, -160.4063) (-0.2547, -160.1254) (-0.32, -159.6579) (-0.4108, -159.0049) (-0.5265, -158.1681) (-0.6664, -157.1492) (-0.8295, -155.9508) (-1.015, -154.5755) (-1.2215, -153.0267) (-1.448, -151.3078) (-1.693, -149.4231) (-1.9553, -147.3767) (-2.2332, -145.1736) (-2.5255, -142.8189) (-2.8305, -140.318) (-3.1466, -137.6768) (-3.4724, -134.9015) (-3.8061, -131.9986) (-4.1463, -128.9748) (-4.4912, -125.8372) (-4.8393, -122.5931) (-5.1889, -119.2502) (-5.5382, -115.8161) (-5.8855, -112.299) (-6.2291, -108.7071) (-6.5672, -105.0486) (-6.8979, -101.3323) (-7.2193, -97.5667) (-7.5294, -93.7607) (-7.8263, -89.9231) (-8.1078, -86.0629) (-8.372, -82.1891) (-8.6167, -78.3109) (-8.8398, -74.4371) (-9.0394, -70.5769) (-9.2132, -66.7394) (-9.3595, -62.9333) (-9.4762, -59.1677) (-9.5617, -55.4514) (-9.6144, -51.793) (-9.6144, -48.201) (-9.6144, -44.6839) (-9.5619, -41.2498) (-9.4708, -37.9069) (-9.3419, -34.6628) (-9.1748, -31.5252) (-8.9696, -28.5014) (-8.7266, -25.5985) (-8.4463, -22.8232) (-8.1295, -20.182) (-7.7773, -17.6811) (-7.3908, -15.3264) (-6.9717, -13.1233) (-6.5213, -11.0769) (-6.0414, -9.1922) (-5.5339, -7.4733) (-5.0005, -5.9245) (-4.4431, -4.5492) (-3.8633, -3.3508) (-3.263, -2.3319) (-2.6435, -1.495) (-2.0064, -0.8421) (-1.3528, -0.3746) (-0.6838, -0.0937) (0, 0) knots 1 1 1 1 1 2 3 4 5 6 7 8 9 10 11 12 13 14 15 16 17 18 19 20 21 22 23 24 25 26 27 28 29 30 31 32 33 34 35 36 37 38 39 40 41 42 43 44 45 46 47 48 49 50 51 52 53 54 55 56 57 58 59 60 61 62 63 64 65 66 67 68 69 70 71 72 73 74 75 76 77 78 79 80 81 82 83 84 85 86 87 88 89 90 91 92 93 94 95 96 97 98 99 100 101 102 103 104 105 106 107 108 109 110 111 112 113 114 115 116 117 118 119 120 121 122 123 124 125 126 127 128 129 130 130 130 130 130
extrude "Extrusion3" add sketch "Sketch9" along normal blind 14
sketch "Sketch10" plane through (14, 0, 0) normal (1, 0, 0) x (0, 0, -1)
  circle A0 centre (36.25, 0) radius 4.05
  point P0 (0, 0)
  dimension "d88" = 8.1
  dimension "d89" = 36.25
extrude "Extrusion4" cut sketch "Sketch10" against normal blind 15
sketch "Sketch12" plane through (0, 0, 0) normal (-1, 0, 0) x (0, 0, 1)
  circle A0 centre (-112.7, 0) radius 2.75
  point P0 (0, 0)
  dimension "d97" = 5.5
  dimension "d98" = 112.7
extrude "Extrusion6" cut sketch "Sketch12" against normal blind 5
properties part number "6P-008" material "Poplar"
